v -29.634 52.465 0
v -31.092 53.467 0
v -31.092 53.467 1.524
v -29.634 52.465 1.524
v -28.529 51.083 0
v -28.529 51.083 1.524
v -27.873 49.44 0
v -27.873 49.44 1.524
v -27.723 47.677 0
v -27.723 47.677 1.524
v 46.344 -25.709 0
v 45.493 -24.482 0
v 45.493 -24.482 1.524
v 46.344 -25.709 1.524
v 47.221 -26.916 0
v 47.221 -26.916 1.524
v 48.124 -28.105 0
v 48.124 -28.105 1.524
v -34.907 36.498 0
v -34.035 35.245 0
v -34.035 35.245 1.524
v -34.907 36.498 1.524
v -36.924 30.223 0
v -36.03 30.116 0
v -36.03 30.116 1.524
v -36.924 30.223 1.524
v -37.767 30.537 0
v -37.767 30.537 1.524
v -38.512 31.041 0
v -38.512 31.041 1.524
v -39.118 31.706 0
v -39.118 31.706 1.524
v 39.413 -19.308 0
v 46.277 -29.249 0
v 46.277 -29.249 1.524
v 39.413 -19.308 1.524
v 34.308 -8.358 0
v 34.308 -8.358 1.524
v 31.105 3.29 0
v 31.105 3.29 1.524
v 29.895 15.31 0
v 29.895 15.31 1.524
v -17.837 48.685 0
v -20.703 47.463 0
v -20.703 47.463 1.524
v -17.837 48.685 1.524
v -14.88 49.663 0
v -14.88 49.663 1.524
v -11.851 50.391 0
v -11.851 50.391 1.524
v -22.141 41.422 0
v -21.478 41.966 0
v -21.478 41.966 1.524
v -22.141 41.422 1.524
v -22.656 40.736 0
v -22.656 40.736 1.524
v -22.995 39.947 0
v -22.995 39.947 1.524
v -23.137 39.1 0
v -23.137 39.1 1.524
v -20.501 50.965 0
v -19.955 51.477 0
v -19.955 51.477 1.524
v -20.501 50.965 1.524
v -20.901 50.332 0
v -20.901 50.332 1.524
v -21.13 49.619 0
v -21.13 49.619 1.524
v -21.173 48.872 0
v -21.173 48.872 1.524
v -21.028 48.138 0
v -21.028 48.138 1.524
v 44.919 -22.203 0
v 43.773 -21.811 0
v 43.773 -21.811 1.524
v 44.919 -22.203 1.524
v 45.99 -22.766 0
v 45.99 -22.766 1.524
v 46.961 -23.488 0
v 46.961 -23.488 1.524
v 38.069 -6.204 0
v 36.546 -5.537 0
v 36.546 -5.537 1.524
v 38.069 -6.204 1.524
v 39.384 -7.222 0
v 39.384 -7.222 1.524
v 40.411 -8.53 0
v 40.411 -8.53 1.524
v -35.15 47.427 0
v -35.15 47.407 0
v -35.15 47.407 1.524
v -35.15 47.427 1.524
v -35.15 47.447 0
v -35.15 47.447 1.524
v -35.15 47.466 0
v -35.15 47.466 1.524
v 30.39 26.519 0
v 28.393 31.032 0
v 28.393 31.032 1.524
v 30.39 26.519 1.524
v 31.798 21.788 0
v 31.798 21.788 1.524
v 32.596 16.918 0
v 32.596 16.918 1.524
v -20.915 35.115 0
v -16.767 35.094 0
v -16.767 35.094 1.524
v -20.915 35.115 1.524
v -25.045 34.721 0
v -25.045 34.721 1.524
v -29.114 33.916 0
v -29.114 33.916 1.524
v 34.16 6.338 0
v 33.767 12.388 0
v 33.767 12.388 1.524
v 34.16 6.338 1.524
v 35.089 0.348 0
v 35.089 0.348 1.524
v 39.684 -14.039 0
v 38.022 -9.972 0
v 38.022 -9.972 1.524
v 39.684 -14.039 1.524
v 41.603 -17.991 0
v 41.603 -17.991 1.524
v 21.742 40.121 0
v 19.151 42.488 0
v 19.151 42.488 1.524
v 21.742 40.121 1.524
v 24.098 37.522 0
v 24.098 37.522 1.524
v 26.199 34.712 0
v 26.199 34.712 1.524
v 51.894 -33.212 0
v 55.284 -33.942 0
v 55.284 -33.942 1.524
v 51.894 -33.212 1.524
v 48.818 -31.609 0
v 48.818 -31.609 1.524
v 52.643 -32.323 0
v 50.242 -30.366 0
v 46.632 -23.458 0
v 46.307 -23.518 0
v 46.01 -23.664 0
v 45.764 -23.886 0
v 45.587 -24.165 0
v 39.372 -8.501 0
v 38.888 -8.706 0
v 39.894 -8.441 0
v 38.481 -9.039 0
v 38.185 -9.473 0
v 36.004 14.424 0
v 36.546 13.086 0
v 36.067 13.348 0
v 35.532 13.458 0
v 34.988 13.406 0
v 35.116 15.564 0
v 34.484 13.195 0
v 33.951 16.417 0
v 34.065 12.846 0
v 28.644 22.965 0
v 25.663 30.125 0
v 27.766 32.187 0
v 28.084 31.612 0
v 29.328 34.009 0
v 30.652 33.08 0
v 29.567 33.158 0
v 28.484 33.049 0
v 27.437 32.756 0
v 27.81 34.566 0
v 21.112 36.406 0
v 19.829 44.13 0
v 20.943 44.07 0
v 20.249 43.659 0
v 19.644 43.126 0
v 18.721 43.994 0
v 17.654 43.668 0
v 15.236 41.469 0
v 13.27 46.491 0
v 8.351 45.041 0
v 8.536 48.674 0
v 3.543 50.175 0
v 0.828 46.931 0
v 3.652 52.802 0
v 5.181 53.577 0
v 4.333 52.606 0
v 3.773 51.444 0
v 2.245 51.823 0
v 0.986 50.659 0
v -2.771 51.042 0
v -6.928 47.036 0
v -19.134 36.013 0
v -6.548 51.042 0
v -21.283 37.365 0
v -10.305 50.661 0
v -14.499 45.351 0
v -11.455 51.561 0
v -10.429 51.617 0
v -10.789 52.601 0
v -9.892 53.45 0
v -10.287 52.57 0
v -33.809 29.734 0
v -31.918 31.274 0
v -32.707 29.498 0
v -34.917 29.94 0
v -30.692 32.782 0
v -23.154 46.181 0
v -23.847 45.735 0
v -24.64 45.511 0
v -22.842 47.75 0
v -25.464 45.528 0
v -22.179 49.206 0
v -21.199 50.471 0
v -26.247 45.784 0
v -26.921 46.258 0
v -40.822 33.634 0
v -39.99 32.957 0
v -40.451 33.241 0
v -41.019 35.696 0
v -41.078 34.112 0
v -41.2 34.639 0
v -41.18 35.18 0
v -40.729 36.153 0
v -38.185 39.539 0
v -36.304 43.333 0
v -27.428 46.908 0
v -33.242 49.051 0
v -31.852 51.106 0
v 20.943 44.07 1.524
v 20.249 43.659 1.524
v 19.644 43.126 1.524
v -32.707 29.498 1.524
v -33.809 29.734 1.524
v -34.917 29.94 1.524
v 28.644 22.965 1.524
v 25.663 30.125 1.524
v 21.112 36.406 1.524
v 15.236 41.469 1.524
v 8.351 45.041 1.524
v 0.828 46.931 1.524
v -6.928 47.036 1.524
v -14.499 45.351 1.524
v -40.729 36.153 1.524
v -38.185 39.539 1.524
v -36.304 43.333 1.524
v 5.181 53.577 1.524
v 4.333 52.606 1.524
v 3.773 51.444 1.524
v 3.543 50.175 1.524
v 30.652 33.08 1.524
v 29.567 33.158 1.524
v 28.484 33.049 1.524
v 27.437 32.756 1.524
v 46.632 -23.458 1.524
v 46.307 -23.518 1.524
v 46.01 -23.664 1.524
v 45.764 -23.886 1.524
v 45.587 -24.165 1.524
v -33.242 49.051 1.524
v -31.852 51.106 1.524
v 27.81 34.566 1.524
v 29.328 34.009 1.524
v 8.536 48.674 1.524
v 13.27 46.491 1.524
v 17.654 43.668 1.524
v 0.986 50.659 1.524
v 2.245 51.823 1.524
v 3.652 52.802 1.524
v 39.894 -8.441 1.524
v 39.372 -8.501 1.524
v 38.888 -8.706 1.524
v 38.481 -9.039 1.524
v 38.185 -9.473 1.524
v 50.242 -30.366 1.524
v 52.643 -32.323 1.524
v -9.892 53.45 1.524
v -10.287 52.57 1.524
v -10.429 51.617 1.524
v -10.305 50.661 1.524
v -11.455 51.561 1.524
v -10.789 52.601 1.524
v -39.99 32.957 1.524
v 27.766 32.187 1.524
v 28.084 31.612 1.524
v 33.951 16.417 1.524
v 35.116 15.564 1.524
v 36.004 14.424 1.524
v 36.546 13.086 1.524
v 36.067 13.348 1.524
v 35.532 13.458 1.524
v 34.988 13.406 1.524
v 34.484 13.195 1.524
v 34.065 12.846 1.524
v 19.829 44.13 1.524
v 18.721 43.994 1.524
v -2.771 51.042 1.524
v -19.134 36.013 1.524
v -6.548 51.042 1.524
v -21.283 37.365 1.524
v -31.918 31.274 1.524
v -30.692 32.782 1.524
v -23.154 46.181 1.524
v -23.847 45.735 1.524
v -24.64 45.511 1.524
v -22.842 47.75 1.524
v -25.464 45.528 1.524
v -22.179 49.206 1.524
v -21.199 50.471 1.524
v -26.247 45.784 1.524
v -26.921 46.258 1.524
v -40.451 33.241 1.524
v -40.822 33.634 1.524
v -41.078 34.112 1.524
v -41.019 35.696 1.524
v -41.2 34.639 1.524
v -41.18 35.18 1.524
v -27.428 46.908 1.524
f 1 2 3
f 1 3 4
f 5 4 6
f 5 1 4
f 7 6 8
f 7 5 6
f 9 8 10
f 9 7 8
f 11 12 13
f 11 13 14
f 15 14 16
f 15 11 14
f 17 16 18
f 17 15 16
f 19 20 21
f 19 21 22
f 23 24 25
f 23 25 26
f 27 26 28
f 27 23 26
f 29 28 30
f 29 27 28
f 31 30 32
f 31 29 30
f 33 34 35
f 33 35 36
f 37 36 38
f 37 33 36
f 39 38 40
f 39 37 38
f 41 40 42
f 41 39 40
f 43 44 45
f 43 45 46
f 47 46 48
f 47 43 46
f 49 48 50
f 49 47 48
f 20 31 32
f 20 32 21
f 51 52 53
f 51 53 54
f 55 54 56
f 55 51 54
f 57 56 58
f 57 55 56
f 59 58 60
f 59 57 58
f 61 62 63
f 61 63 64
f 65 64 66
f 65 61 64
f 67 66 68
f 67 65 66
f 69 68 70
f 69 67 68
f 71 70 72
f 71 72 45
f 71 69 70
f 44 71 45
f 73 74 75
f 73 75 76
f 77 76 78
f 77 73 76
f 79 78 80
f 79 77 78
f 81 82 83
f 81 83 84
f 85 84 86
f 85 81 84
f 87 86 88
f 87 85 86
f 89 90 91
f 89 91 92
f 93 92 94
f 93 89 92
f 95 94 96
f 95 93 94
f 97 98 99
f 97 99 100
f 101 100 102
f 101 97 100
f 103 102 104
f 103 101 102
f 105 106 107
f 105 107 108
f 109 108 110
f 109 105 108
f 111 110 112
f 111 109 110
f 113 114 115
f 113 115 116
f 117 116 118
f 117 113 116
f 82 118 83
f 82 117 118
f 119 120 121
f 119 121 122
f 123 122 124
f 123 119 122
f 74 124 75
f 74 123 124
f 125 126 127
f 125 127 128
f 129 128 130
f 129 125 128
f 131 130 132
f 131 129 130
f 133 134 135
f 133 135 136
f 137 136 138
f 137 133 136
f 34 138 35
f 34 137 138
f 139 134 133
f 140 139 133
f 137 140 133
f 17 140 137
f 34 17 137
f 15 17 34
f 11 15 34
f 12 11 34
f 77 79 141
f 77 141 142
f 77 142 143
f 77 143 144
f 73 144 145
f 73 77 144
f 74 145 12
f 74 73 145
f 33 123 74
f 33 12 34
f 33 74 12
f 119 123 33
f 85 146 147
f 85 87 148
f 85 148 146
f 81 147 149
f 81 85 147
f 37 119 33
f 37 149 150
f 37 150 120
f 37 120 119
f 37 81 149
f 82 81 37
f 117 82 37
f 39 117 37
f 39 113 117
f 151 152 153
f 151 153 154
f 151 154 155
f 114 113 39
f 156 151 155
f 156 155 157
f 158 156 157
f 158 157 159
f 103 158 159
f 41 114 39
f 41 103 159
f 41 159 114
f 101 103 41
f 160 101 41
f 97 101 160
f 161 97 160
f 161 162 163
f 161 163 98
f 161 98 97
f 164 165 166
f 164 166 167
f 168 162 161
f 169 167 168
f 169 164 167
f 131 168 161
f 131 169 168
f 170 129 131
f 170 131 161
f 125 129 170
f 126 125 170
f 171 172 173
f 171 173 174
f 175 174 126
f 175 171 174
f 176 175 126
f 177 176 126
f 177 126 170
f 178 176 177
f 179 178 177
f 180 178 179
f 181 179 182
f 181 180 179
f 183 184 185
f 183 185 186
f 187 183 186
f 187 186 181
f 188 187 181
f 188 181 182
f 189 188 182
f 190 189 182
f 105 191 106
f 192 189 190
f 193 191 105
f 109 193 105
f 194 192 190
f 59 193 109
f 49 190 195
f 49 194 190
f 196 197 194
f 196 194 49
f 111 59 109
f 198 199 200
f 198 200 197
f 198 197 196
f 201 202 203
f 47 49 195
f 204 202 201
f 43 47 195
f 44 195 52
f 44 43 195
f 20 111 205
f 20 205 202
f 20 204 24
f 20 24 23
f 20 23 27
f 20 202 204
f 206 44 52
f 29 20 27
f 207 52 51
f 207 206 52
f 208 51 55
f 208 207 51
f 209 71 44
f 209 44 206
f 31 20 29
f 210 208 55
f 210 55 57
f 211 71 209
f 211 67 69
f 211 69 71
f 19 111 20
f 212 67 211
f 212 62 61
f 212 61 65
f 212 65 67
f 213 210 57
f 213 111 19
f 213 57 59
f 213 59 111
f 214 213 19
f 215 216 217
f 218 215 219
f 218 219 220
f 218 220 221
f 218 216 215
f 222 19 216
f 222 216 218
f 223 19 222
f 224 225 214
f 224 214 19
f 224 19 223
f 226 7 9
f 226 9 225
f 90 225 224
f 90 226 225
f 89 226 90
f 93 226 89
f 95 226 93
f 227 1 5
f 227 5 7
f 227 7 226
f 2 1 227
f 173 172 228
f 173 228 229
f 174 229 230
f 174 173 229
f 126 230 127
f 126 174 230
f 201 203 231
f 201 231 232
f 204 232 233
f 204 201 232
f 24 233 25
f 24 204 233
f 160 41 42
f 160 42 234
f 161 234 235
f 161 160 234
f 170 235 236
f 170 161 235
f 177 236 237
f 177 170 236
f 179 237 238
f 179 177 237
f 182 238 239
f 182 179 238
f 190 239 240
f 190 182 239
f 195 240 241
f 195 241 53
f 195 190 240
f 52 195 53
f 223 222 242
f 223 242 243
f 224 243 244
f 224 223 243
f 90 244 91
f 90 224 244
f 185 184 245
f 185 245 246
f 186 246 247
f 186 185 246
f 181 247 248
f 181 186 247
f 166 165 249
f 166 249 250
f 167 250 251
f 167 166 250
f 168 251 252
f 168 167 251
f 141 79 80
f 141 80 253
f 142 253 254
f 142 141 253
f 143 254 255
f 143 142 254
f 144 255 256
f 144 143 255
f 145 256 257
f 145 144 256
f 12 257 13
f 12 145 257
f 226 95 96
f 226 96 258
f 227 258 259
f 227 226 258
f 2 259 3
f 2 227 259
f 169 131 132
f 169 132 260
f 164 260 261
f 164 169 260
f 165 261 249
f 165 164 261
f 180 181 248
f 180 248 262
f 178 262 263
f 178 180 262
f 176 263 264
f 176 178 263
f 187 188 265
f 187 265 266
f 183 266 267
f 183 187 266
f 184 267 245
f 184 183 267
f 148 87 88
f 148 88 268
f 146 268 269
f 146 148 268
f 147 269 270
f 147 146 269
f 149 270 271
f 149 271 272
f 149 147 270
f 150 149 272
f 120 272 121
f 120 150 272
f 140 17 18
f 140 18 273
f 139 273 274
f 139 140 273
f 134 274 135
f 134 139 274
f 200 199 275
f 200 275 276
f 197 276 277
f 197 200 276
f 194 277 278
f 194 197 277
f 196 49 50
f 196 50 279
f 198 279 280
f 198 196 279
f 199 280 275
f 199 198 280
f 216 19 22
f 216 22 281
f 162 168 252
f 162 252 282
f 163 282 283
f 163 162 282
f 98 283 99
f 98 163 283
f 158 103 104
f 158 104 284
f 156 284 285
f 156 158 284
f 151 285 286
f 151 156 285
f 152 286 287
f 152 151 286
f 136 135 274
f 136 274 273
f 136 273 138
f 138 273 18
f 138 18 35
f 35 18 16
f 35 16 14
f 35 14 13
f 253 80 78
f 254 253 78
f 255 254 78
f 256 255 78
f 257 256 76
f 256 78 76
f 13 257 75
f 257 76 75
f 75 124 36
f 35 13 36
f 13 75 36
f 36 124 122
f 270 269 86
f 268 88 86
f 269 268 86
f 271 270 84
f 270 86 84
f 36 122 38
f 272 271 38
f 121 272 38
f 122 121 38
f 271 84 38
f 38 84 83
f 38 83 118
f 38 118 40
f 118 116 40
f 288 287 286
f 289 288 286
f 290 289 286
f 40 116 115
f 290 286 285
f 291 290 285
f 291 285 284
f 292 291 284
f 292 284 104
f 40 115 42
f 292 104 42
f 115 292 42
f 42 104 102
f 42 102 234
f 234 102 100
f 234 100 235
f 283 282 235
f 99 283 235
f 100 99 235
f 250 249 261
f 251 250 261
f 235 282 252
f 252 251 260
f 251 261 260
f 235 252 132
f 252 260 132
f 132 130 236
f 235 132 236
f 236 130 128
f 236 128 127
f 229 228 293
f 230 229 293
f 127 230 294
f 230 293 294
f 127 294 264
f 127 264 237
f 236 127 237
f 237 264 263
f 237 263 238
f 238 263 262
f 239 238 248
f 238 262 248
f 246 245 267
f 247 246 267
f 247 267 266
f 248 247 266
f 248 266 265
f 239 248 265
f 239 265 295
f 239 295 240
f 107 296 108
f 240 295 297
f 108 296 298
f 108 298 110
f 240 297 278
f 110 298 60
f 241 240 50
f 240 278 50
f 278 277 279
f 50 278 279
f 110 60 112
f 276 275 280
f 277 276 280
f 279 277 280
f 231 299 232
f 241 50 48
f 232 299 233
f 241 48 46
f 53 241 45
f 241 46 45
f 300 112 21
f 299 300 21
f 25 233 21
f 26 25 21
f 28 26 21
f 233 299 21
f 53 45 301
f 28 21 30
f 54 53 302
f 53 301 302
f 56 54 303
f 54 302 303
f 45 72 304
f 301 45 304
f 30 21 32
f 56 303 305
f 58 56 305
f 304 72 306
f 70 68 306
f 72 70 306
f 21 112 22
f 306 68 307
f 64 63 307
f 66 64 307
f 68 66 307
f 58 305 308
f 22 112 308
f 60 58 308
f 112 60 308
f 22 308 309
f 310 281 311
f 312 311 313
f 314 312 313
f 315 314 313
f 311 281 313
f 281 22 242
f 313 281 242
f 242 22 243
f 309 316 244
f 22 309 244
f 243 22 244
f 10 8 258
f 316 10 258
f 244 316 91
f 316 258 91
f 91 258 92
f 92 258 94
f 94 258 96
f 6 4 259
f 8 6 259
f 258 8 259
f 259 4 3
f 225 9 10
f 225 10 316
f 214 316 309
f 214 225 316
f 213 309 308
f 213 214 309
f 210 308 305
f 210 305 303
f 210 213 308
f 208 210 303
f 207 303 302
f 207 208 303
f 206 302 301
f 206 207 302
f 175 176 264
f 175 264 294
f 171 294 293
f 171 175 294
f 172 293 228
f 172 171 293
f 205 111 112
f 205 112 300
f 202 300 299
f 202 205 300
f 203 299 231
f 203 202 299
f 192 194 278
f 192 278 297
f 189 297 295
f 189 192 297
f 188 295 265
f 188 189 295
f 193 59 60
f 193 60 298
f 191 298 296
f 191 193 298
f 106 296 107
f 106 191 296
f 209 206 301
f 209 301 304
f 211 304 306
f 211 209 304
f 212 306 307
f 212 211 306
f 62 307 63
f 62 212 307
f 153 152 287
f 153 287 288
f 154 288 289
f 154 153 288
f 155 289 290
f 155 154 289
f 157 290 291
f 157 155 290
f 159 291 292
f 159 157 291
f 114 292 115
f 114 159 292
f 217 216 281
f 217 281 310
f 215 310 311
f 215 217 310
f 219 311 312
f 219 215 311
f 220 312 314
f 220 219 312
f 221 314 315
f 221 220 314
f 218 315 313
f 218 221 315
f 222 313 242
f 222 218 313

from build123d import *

# Parameters (mm, degrees)
BOSS_EXTRUDE1_DEPTH = 1.524


with BuildPart() as part:
    # Sketch1 → Boss-Extrude1 (new body)
    with BuildSketch(Plane.XY):
        with BuildLine():
            Line((-39.117691612, 31.705702494), (-34.035061267, 35.245462587))
            Line((-34.035061267, 35.245462587), (-34.907334502, 36.4982372))
            Line((-34.907334502, 36.4982372), (-39.989964847, 32.957484201))
            ThreePointArc((-39.989964847, 32.957484201), (-41.156381442, 34.371130843), (-40.72943499, 36.153444291))
            ThreePointArc((-40.72943499, 36.153444291), (-37.157257908, 41.392315435), (-35.149645056, 47.406940162))
            ThreePointArc((-35.149645056, 47.406940162), (-35.150000593, 47.436618983), (-35.150119107, 47.466299697))
            ThreePointArc((-35.150119107, 47.466299697), (-32.474220558, 50.029100651), (-31.092386734, 53.46696584))
            ThreePointArc((-31.092386734, 53.46696584), (-28.528895289, 51.083388449), (-27.722652605, 47.677085129))
            ThreePointArc((-27.722652605, 47.677085129), (-25.864549179, 45.627042683), (-23.153757297, 46.180964831))
            ThreePointArc((-23.153757297, 46.180964831), (-22.178534836, 49.206145698), (-19.954812919, 51.477233316))
            ThreePointArc((-19.954812919, 51.477233316), (-21.130091376, 49.619411518), (-20.702707555, 47.462996819))
            ThreePointArc((-20.702707555, 47.462996819), (-16.368548246, 49.204688548), (-11.850579294, 50.390598976))
            ThreePointArc((-11.850579294, 50.390598976), (-11.153919, 52.10102423), (-9.892322836, 53.449825638))
            ThreePointArc((-9.892322836, 53.449825638), (-10.390962499, 52.098435339), (-10.305463017, 50.66052467))
            ThreePointArc((-10.305463017, 50.66052467), (-4.659496824, 51.089737509), (0.986334207, 50.658750415))
            ThreePointArc((0.986334207, 50.658750415), (2.931593893, 52.336657489), (5.181027531, 53.577405529))
            ThreePointArc((5.181027531, 53.577405529), (4.013781328, 52.043650888), (3.542618472, 50.174728054))
            ThreePointArc((3.542618472, 50.174728054), (10.941086412, 47.665032068), (17.653861509, 43.668214296))
            ThreePointArc((17.653861509, 43.668214296), (19.271772807, 44.086118721), (20.942706276, 44.069919276))
            ThreePointArc((20.942706276, 44.069919276), (19.933918295, 43.40682582), (19.151343007, 42.48762941))
            ThreePointArc((19.151343007, 42.48762941), (22.950326986, 38.849120016), (26.199236503, 34.712017549))
            ThreePointArc((26.199236503, 34.712017549), (28.587130465, 34.336897034), (30.651629038, 33.079678433))
            ThreePointArc((30.651629038, 33.079678433), (29.023098561, 33.126789379), (27.436671978, 32.755869369))
            ThreePointArc((27.436671978, 32.755869369), (27.926256891, 31.900308765), (28.393045297, 31.032100312))
            ThreePointArc((28.393045297, 31.032100312), (31.169330508, 24.1759064), (32.596114117, 16.917845842))
            ThreePointArc((32.596114117, 16.917845842), (35.116195442, 15.563753706), (36.545589929, 13.085607866))
            ThreePointArc((36.545589929, 13.085607866), (34.988216261, 13.405663895), (33.766569049, 12.388104711))
            ThreePointArc((33.766569049, 12.388104711), (34.557842987, 3.332770711), (36.545589929, -5.537068656))
            ThreePointArc((36.545589929, -5.537068656), (38.757623722, -6.672814151), (40.411337246, -8.52975866))
            ThreePointArc((40.411337246, -8.52975866), (38.887733864, -8.706049408), (38.022049175, -9.972159875))
            ThreePointArc((38.022049175, -9.972159875), (40.611583977, -16.03077135), (43.773329776, -21.811413788))
            ThreePointArc((43.773329776, -21.811413788), (45.465168408, -22.463416845), (46.96111524, -23.487901602))
            ThreePointArc((46.96111524, -23.487901602), (46.009909008, -23.664428409), (45.493072894, -24.482252008))
            ThreePointArc((45.493072894, -24.482252008), (46.778816766, -26.31501847), (48.123987434, -28.104623476))
            ThreePointArc((48.123987434, -28.104623476), (51.40918984, -31.384637985), (55.283874059, -33.941564308))
            ThreePointArc((55.283874059, -33.941564308), (50.301959018, -32.513729239), (46.276855411, -29.249264289))
            ThreePointArc((46.276855411, -29.249264289), (34.30827338, -8.358491308), (29.894604694, 15.309860564))
            ThreePointArc((29.894604694, 15.309860564), (11.897133565, 43.455618791), (-21.477635315, 41.96649978))
            ThreePointArc((-21.477635315, 41.96649978), (-22.656445953, 40.735662089), (-23.136633245, 39.10043241))
            ThreePointArc((-23.136633245, 39.10043241), (-20.241057696, 36.637371423), (-16.767124999, 35.093733251))
            ThreePointArc((-16.767124999, 35.093733251), (-22.9849523, 34.969630573), (-29.11414449, 33.916169174))
            ThreePointArc((-29.11414449, 33.916169174), (-31.355074443, 32.068657032), (-32.706500842, 29.497914951))
            ThreePointArc((-32.706500842, 29.497914951), (-34.36207957, 29.840980807), (-36.03028603, 30.116157682))
            ThreePointArc((-36.03028603, 30.116157682), (-37.766569844, 30.536876005), (-39.117691612, 31.705702494))
        make_face()
    extrude(amount=BOSS_EXTRUDE1_DEPTH)


solid = part.part
